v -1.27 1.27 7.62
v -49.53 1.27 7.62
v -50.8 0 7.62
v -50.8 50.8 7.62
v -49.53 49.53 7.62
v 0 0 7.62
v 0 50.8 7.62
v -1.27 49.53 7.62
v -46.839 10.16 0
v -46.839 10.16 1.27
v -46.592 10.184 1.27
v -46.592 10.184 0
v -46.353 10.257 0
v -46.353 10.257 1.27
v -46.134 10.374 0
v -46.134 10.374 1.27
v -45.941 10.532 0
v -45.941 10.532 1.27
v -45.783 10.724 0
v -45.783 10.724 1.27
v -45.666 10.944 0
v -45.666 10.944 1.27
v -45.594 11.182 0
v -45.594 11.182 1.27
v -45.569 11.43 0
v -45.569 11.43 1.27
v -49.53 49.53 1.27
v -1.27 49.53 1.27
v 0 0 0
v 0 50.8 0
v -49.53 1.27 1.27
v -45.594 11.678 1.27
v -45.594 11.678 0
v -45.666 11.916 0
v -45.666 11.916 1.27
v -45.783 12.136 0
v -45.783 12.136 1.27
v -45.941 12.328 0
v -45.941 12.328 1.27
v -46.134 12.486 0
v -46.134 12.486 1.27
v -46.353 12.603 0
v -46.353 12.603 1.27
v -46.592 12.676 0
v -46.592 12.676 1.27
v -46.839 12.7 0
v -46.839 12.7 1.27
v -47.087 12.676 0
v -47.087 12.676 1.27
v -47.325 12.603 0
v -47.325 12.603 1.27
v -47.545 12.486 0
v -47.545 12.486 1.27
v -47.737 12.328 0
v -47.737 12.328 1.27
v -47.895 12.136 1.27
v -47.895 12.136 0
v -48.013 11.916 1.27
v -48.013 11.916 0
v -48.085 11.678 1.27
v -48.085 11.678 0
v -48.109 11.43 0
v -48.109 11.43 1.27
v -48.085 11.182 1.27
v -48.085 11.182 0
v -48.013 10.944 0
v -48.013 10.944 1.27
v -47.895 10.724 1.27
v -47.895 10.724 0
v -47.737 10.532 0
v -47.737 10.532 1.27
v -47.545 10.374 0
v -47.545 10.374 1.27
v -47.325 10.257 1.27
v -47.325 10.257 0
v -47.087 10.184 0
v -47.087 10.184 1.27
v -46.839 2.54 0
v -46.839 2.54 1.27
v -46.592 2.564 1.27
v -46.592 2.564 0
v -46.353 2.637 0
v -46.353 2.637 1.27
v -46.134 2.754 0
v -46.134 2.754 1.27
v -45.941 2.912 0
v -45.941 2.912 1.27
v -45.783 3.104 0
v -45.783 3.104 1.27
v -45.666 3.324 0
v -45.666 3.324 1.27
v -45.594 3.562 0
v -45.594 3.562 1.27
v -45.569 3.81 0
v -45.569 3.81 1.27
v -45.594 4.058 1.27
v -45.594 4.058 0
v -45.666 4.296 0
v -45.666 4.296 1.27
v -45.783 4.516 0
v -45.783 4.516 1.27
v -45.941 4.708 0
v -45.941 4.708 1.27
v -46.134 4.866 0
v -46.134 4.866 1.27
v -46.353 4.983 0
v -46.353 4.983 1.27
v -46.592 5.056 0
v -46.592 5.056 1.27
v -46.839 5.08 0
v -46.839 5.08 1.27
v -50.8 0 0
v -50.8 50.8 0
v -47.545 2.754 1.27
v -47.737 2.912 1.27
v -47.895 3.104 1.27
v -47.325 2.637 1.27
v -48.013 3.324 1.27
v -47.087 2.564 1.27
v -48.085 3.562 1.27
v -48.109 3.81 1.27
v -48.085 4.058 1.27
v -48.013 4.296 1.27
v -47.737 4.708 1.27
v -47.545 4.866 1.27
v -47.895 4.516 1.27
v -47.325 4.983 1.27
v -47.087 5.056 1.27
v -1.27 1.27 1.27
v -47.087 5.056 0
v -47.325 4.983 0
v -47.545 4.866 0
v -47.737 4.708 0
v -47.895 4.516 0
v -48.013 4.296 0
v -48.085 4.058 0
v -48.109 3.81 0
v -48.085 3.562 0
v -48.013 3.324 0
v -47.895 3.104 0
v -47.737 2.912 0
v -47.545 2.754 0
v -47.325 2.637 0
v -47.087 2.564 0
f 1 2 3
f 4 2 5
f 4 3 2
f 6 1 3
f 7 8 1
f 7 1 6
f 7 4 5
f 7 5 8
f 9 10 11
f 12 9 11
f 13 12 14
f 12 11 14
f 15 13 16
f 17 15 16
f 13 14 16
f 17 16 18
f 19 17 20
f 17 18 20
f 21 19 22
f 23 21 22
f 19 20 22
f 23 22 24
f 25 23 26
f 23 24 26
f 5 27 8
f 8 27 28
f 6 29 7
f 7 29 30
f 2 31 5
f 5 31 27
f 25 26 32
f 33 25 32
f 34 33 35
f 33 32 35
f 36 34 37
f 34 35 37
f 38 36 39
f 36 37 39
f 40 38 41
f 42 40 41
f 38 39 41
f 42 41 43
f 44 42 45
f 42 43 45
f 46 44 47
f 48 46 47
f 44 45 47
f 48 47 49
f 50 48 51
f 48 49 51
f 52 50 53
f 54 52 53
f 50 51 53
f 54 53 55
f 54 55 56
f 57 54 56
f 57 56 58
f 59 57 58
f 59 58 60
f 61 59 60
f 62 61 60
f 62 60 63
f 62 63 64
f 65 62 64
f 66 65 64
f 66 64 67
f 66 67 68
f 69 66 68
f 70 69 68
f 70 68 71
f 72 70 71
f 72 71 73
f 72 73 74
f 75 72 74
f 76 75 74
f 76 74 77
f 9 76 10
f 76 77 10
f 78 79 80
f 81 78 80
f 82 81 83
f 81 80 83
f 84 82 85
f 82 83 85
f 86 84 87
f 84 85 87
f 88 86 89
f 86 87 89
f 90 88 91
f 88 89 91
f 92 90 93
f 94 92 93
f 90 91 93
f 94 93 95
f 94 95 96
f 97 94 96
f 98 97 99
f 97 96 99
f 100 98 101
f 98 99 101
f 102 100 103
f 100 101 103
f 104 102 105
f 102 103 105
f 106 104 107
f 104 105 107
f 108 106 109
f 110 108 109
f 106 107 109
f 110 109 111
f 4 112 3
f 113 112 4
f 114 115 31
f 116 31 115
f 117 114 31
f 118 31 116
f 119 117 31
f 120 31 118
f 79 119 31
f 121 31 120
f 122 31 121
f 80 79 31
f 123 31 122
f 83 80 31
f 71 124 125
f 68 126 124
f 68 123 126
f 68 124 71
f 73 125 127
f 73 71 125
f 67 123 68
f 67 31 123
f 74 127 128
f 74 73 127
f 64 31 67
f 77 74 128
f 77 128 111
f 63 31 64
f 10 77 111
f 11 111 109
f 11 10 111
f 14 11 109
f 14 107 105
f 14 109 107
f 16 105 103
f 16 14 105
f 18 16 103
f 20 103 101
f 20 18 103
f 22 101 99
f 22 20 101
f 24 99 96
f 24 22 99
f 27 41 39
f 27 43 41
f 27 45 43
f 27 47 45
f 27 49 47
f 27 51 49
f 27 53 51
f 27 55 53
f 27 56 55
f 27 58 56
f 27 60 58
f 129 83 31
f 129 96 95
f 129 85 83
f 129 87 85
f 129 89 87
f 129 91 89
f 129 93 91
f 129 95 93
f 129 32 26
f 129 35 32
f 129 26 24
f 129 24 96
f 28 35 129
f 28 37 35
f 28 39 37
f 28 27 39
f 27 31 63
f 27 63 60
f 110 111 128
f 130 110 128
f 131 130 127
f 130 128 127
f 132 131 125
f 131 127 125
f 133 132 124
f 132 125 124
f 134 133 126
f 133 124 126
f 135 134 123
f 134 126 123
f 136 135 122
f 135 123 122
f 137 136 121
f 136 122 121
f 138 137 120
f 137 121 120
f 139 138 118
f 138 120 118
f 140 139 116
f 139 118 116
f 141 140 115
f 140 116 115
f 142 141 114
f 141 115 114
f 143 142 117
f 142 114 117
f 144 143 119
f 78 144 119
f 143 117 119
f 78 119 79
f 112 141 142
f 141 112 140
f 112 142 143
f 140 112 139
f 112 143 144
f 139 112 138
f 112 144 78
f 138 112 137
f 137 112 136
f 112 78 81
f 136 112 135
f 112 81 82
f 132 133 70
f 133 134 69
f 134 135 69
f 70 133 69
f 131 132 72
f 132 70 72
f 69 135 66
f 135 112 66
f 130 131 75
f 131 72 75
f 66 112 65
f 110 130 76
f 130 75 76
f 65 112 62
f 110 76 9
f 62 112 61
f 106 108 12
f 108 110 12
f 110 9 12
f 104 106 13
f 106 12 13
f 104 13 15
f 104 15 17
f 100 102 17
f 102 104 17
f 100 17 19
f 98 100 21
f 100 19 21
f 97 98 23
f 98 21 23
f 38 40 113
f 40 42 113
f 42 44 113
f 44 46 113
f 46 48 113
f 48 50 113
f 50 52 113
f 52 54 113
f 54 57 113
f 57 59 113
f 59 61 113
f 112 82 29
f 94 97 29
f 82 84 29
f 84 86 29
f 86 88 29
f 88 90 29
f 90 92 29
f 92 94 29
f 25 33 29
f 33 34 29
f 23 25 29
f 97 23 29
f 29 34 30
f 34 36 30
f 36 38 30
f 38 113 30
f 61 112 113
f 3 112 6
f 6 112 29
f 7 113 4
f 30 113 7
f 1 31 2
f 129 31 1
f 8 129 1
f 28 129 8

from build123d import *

# Parameters (mm, degrees)
F0_W     = 50.8
F0_H     = 50.8
F1_DEPTH = 7.62
F2_T     = -1.27
F4_DEPTH = 25.4


with BuildPart() as f1:
    # F0 (on Top) → F1 (new body)
    with BuildSketch(Plane.XY):
        with Locations((-25.4, 25.4)):
            Rectangle(F0_W, F0_H)
    extrude(amount=F1_DEPTH)

    # F2
    f2_openings = [f1.faces().sort_by_distance(p)[0] for p in [
        (-25.4, 25.4, 7.62),
    ]]
    offset(amount=F2_T, openings=f2_openings)

    # F3 (on face) → F4 (cut)
    with BuildSketch(Plane.XY.offset(1.27)):
        with BuildLine():
            ThreePointArc((-45.569412, 11.43), (-47.737438, 12.328026), (-46.839412, 10.16))
            ThreePointArc((-46.839412, 10.16), (-45.941387, 10.531974), (-45.569412, 11.43))
        make_face()
        with BuildLine():
            ThreePointArc((-46.839412, 5.08), (-48.109412, 3.81), (-46.839412, 2.54))
            Line((-46.839412, 2.54), (-46.839412, 3.81))
            Line((-46.839412, 3.81), (-46.839412, 5.08))
        make_face()
        with BuildLine():
            Line((-46.839412, 3.81), (-46.839412, 2.54))
            ThreePointArc((-46.839412, 2.54), (-45.941387, 2.911974), (-45.569412, 3.81))
            ThreePointArc((-45.569412, 3.81), (-45.941387, 4.708026), (-46.839412, 5.08))
            Line((-46.839412, 5.08), (-46.839412, 3.81))
        make_face()
    extrude(amount=-F4_DEPTH, mode=Mode.SUBTRACT)


solid = f1.part
